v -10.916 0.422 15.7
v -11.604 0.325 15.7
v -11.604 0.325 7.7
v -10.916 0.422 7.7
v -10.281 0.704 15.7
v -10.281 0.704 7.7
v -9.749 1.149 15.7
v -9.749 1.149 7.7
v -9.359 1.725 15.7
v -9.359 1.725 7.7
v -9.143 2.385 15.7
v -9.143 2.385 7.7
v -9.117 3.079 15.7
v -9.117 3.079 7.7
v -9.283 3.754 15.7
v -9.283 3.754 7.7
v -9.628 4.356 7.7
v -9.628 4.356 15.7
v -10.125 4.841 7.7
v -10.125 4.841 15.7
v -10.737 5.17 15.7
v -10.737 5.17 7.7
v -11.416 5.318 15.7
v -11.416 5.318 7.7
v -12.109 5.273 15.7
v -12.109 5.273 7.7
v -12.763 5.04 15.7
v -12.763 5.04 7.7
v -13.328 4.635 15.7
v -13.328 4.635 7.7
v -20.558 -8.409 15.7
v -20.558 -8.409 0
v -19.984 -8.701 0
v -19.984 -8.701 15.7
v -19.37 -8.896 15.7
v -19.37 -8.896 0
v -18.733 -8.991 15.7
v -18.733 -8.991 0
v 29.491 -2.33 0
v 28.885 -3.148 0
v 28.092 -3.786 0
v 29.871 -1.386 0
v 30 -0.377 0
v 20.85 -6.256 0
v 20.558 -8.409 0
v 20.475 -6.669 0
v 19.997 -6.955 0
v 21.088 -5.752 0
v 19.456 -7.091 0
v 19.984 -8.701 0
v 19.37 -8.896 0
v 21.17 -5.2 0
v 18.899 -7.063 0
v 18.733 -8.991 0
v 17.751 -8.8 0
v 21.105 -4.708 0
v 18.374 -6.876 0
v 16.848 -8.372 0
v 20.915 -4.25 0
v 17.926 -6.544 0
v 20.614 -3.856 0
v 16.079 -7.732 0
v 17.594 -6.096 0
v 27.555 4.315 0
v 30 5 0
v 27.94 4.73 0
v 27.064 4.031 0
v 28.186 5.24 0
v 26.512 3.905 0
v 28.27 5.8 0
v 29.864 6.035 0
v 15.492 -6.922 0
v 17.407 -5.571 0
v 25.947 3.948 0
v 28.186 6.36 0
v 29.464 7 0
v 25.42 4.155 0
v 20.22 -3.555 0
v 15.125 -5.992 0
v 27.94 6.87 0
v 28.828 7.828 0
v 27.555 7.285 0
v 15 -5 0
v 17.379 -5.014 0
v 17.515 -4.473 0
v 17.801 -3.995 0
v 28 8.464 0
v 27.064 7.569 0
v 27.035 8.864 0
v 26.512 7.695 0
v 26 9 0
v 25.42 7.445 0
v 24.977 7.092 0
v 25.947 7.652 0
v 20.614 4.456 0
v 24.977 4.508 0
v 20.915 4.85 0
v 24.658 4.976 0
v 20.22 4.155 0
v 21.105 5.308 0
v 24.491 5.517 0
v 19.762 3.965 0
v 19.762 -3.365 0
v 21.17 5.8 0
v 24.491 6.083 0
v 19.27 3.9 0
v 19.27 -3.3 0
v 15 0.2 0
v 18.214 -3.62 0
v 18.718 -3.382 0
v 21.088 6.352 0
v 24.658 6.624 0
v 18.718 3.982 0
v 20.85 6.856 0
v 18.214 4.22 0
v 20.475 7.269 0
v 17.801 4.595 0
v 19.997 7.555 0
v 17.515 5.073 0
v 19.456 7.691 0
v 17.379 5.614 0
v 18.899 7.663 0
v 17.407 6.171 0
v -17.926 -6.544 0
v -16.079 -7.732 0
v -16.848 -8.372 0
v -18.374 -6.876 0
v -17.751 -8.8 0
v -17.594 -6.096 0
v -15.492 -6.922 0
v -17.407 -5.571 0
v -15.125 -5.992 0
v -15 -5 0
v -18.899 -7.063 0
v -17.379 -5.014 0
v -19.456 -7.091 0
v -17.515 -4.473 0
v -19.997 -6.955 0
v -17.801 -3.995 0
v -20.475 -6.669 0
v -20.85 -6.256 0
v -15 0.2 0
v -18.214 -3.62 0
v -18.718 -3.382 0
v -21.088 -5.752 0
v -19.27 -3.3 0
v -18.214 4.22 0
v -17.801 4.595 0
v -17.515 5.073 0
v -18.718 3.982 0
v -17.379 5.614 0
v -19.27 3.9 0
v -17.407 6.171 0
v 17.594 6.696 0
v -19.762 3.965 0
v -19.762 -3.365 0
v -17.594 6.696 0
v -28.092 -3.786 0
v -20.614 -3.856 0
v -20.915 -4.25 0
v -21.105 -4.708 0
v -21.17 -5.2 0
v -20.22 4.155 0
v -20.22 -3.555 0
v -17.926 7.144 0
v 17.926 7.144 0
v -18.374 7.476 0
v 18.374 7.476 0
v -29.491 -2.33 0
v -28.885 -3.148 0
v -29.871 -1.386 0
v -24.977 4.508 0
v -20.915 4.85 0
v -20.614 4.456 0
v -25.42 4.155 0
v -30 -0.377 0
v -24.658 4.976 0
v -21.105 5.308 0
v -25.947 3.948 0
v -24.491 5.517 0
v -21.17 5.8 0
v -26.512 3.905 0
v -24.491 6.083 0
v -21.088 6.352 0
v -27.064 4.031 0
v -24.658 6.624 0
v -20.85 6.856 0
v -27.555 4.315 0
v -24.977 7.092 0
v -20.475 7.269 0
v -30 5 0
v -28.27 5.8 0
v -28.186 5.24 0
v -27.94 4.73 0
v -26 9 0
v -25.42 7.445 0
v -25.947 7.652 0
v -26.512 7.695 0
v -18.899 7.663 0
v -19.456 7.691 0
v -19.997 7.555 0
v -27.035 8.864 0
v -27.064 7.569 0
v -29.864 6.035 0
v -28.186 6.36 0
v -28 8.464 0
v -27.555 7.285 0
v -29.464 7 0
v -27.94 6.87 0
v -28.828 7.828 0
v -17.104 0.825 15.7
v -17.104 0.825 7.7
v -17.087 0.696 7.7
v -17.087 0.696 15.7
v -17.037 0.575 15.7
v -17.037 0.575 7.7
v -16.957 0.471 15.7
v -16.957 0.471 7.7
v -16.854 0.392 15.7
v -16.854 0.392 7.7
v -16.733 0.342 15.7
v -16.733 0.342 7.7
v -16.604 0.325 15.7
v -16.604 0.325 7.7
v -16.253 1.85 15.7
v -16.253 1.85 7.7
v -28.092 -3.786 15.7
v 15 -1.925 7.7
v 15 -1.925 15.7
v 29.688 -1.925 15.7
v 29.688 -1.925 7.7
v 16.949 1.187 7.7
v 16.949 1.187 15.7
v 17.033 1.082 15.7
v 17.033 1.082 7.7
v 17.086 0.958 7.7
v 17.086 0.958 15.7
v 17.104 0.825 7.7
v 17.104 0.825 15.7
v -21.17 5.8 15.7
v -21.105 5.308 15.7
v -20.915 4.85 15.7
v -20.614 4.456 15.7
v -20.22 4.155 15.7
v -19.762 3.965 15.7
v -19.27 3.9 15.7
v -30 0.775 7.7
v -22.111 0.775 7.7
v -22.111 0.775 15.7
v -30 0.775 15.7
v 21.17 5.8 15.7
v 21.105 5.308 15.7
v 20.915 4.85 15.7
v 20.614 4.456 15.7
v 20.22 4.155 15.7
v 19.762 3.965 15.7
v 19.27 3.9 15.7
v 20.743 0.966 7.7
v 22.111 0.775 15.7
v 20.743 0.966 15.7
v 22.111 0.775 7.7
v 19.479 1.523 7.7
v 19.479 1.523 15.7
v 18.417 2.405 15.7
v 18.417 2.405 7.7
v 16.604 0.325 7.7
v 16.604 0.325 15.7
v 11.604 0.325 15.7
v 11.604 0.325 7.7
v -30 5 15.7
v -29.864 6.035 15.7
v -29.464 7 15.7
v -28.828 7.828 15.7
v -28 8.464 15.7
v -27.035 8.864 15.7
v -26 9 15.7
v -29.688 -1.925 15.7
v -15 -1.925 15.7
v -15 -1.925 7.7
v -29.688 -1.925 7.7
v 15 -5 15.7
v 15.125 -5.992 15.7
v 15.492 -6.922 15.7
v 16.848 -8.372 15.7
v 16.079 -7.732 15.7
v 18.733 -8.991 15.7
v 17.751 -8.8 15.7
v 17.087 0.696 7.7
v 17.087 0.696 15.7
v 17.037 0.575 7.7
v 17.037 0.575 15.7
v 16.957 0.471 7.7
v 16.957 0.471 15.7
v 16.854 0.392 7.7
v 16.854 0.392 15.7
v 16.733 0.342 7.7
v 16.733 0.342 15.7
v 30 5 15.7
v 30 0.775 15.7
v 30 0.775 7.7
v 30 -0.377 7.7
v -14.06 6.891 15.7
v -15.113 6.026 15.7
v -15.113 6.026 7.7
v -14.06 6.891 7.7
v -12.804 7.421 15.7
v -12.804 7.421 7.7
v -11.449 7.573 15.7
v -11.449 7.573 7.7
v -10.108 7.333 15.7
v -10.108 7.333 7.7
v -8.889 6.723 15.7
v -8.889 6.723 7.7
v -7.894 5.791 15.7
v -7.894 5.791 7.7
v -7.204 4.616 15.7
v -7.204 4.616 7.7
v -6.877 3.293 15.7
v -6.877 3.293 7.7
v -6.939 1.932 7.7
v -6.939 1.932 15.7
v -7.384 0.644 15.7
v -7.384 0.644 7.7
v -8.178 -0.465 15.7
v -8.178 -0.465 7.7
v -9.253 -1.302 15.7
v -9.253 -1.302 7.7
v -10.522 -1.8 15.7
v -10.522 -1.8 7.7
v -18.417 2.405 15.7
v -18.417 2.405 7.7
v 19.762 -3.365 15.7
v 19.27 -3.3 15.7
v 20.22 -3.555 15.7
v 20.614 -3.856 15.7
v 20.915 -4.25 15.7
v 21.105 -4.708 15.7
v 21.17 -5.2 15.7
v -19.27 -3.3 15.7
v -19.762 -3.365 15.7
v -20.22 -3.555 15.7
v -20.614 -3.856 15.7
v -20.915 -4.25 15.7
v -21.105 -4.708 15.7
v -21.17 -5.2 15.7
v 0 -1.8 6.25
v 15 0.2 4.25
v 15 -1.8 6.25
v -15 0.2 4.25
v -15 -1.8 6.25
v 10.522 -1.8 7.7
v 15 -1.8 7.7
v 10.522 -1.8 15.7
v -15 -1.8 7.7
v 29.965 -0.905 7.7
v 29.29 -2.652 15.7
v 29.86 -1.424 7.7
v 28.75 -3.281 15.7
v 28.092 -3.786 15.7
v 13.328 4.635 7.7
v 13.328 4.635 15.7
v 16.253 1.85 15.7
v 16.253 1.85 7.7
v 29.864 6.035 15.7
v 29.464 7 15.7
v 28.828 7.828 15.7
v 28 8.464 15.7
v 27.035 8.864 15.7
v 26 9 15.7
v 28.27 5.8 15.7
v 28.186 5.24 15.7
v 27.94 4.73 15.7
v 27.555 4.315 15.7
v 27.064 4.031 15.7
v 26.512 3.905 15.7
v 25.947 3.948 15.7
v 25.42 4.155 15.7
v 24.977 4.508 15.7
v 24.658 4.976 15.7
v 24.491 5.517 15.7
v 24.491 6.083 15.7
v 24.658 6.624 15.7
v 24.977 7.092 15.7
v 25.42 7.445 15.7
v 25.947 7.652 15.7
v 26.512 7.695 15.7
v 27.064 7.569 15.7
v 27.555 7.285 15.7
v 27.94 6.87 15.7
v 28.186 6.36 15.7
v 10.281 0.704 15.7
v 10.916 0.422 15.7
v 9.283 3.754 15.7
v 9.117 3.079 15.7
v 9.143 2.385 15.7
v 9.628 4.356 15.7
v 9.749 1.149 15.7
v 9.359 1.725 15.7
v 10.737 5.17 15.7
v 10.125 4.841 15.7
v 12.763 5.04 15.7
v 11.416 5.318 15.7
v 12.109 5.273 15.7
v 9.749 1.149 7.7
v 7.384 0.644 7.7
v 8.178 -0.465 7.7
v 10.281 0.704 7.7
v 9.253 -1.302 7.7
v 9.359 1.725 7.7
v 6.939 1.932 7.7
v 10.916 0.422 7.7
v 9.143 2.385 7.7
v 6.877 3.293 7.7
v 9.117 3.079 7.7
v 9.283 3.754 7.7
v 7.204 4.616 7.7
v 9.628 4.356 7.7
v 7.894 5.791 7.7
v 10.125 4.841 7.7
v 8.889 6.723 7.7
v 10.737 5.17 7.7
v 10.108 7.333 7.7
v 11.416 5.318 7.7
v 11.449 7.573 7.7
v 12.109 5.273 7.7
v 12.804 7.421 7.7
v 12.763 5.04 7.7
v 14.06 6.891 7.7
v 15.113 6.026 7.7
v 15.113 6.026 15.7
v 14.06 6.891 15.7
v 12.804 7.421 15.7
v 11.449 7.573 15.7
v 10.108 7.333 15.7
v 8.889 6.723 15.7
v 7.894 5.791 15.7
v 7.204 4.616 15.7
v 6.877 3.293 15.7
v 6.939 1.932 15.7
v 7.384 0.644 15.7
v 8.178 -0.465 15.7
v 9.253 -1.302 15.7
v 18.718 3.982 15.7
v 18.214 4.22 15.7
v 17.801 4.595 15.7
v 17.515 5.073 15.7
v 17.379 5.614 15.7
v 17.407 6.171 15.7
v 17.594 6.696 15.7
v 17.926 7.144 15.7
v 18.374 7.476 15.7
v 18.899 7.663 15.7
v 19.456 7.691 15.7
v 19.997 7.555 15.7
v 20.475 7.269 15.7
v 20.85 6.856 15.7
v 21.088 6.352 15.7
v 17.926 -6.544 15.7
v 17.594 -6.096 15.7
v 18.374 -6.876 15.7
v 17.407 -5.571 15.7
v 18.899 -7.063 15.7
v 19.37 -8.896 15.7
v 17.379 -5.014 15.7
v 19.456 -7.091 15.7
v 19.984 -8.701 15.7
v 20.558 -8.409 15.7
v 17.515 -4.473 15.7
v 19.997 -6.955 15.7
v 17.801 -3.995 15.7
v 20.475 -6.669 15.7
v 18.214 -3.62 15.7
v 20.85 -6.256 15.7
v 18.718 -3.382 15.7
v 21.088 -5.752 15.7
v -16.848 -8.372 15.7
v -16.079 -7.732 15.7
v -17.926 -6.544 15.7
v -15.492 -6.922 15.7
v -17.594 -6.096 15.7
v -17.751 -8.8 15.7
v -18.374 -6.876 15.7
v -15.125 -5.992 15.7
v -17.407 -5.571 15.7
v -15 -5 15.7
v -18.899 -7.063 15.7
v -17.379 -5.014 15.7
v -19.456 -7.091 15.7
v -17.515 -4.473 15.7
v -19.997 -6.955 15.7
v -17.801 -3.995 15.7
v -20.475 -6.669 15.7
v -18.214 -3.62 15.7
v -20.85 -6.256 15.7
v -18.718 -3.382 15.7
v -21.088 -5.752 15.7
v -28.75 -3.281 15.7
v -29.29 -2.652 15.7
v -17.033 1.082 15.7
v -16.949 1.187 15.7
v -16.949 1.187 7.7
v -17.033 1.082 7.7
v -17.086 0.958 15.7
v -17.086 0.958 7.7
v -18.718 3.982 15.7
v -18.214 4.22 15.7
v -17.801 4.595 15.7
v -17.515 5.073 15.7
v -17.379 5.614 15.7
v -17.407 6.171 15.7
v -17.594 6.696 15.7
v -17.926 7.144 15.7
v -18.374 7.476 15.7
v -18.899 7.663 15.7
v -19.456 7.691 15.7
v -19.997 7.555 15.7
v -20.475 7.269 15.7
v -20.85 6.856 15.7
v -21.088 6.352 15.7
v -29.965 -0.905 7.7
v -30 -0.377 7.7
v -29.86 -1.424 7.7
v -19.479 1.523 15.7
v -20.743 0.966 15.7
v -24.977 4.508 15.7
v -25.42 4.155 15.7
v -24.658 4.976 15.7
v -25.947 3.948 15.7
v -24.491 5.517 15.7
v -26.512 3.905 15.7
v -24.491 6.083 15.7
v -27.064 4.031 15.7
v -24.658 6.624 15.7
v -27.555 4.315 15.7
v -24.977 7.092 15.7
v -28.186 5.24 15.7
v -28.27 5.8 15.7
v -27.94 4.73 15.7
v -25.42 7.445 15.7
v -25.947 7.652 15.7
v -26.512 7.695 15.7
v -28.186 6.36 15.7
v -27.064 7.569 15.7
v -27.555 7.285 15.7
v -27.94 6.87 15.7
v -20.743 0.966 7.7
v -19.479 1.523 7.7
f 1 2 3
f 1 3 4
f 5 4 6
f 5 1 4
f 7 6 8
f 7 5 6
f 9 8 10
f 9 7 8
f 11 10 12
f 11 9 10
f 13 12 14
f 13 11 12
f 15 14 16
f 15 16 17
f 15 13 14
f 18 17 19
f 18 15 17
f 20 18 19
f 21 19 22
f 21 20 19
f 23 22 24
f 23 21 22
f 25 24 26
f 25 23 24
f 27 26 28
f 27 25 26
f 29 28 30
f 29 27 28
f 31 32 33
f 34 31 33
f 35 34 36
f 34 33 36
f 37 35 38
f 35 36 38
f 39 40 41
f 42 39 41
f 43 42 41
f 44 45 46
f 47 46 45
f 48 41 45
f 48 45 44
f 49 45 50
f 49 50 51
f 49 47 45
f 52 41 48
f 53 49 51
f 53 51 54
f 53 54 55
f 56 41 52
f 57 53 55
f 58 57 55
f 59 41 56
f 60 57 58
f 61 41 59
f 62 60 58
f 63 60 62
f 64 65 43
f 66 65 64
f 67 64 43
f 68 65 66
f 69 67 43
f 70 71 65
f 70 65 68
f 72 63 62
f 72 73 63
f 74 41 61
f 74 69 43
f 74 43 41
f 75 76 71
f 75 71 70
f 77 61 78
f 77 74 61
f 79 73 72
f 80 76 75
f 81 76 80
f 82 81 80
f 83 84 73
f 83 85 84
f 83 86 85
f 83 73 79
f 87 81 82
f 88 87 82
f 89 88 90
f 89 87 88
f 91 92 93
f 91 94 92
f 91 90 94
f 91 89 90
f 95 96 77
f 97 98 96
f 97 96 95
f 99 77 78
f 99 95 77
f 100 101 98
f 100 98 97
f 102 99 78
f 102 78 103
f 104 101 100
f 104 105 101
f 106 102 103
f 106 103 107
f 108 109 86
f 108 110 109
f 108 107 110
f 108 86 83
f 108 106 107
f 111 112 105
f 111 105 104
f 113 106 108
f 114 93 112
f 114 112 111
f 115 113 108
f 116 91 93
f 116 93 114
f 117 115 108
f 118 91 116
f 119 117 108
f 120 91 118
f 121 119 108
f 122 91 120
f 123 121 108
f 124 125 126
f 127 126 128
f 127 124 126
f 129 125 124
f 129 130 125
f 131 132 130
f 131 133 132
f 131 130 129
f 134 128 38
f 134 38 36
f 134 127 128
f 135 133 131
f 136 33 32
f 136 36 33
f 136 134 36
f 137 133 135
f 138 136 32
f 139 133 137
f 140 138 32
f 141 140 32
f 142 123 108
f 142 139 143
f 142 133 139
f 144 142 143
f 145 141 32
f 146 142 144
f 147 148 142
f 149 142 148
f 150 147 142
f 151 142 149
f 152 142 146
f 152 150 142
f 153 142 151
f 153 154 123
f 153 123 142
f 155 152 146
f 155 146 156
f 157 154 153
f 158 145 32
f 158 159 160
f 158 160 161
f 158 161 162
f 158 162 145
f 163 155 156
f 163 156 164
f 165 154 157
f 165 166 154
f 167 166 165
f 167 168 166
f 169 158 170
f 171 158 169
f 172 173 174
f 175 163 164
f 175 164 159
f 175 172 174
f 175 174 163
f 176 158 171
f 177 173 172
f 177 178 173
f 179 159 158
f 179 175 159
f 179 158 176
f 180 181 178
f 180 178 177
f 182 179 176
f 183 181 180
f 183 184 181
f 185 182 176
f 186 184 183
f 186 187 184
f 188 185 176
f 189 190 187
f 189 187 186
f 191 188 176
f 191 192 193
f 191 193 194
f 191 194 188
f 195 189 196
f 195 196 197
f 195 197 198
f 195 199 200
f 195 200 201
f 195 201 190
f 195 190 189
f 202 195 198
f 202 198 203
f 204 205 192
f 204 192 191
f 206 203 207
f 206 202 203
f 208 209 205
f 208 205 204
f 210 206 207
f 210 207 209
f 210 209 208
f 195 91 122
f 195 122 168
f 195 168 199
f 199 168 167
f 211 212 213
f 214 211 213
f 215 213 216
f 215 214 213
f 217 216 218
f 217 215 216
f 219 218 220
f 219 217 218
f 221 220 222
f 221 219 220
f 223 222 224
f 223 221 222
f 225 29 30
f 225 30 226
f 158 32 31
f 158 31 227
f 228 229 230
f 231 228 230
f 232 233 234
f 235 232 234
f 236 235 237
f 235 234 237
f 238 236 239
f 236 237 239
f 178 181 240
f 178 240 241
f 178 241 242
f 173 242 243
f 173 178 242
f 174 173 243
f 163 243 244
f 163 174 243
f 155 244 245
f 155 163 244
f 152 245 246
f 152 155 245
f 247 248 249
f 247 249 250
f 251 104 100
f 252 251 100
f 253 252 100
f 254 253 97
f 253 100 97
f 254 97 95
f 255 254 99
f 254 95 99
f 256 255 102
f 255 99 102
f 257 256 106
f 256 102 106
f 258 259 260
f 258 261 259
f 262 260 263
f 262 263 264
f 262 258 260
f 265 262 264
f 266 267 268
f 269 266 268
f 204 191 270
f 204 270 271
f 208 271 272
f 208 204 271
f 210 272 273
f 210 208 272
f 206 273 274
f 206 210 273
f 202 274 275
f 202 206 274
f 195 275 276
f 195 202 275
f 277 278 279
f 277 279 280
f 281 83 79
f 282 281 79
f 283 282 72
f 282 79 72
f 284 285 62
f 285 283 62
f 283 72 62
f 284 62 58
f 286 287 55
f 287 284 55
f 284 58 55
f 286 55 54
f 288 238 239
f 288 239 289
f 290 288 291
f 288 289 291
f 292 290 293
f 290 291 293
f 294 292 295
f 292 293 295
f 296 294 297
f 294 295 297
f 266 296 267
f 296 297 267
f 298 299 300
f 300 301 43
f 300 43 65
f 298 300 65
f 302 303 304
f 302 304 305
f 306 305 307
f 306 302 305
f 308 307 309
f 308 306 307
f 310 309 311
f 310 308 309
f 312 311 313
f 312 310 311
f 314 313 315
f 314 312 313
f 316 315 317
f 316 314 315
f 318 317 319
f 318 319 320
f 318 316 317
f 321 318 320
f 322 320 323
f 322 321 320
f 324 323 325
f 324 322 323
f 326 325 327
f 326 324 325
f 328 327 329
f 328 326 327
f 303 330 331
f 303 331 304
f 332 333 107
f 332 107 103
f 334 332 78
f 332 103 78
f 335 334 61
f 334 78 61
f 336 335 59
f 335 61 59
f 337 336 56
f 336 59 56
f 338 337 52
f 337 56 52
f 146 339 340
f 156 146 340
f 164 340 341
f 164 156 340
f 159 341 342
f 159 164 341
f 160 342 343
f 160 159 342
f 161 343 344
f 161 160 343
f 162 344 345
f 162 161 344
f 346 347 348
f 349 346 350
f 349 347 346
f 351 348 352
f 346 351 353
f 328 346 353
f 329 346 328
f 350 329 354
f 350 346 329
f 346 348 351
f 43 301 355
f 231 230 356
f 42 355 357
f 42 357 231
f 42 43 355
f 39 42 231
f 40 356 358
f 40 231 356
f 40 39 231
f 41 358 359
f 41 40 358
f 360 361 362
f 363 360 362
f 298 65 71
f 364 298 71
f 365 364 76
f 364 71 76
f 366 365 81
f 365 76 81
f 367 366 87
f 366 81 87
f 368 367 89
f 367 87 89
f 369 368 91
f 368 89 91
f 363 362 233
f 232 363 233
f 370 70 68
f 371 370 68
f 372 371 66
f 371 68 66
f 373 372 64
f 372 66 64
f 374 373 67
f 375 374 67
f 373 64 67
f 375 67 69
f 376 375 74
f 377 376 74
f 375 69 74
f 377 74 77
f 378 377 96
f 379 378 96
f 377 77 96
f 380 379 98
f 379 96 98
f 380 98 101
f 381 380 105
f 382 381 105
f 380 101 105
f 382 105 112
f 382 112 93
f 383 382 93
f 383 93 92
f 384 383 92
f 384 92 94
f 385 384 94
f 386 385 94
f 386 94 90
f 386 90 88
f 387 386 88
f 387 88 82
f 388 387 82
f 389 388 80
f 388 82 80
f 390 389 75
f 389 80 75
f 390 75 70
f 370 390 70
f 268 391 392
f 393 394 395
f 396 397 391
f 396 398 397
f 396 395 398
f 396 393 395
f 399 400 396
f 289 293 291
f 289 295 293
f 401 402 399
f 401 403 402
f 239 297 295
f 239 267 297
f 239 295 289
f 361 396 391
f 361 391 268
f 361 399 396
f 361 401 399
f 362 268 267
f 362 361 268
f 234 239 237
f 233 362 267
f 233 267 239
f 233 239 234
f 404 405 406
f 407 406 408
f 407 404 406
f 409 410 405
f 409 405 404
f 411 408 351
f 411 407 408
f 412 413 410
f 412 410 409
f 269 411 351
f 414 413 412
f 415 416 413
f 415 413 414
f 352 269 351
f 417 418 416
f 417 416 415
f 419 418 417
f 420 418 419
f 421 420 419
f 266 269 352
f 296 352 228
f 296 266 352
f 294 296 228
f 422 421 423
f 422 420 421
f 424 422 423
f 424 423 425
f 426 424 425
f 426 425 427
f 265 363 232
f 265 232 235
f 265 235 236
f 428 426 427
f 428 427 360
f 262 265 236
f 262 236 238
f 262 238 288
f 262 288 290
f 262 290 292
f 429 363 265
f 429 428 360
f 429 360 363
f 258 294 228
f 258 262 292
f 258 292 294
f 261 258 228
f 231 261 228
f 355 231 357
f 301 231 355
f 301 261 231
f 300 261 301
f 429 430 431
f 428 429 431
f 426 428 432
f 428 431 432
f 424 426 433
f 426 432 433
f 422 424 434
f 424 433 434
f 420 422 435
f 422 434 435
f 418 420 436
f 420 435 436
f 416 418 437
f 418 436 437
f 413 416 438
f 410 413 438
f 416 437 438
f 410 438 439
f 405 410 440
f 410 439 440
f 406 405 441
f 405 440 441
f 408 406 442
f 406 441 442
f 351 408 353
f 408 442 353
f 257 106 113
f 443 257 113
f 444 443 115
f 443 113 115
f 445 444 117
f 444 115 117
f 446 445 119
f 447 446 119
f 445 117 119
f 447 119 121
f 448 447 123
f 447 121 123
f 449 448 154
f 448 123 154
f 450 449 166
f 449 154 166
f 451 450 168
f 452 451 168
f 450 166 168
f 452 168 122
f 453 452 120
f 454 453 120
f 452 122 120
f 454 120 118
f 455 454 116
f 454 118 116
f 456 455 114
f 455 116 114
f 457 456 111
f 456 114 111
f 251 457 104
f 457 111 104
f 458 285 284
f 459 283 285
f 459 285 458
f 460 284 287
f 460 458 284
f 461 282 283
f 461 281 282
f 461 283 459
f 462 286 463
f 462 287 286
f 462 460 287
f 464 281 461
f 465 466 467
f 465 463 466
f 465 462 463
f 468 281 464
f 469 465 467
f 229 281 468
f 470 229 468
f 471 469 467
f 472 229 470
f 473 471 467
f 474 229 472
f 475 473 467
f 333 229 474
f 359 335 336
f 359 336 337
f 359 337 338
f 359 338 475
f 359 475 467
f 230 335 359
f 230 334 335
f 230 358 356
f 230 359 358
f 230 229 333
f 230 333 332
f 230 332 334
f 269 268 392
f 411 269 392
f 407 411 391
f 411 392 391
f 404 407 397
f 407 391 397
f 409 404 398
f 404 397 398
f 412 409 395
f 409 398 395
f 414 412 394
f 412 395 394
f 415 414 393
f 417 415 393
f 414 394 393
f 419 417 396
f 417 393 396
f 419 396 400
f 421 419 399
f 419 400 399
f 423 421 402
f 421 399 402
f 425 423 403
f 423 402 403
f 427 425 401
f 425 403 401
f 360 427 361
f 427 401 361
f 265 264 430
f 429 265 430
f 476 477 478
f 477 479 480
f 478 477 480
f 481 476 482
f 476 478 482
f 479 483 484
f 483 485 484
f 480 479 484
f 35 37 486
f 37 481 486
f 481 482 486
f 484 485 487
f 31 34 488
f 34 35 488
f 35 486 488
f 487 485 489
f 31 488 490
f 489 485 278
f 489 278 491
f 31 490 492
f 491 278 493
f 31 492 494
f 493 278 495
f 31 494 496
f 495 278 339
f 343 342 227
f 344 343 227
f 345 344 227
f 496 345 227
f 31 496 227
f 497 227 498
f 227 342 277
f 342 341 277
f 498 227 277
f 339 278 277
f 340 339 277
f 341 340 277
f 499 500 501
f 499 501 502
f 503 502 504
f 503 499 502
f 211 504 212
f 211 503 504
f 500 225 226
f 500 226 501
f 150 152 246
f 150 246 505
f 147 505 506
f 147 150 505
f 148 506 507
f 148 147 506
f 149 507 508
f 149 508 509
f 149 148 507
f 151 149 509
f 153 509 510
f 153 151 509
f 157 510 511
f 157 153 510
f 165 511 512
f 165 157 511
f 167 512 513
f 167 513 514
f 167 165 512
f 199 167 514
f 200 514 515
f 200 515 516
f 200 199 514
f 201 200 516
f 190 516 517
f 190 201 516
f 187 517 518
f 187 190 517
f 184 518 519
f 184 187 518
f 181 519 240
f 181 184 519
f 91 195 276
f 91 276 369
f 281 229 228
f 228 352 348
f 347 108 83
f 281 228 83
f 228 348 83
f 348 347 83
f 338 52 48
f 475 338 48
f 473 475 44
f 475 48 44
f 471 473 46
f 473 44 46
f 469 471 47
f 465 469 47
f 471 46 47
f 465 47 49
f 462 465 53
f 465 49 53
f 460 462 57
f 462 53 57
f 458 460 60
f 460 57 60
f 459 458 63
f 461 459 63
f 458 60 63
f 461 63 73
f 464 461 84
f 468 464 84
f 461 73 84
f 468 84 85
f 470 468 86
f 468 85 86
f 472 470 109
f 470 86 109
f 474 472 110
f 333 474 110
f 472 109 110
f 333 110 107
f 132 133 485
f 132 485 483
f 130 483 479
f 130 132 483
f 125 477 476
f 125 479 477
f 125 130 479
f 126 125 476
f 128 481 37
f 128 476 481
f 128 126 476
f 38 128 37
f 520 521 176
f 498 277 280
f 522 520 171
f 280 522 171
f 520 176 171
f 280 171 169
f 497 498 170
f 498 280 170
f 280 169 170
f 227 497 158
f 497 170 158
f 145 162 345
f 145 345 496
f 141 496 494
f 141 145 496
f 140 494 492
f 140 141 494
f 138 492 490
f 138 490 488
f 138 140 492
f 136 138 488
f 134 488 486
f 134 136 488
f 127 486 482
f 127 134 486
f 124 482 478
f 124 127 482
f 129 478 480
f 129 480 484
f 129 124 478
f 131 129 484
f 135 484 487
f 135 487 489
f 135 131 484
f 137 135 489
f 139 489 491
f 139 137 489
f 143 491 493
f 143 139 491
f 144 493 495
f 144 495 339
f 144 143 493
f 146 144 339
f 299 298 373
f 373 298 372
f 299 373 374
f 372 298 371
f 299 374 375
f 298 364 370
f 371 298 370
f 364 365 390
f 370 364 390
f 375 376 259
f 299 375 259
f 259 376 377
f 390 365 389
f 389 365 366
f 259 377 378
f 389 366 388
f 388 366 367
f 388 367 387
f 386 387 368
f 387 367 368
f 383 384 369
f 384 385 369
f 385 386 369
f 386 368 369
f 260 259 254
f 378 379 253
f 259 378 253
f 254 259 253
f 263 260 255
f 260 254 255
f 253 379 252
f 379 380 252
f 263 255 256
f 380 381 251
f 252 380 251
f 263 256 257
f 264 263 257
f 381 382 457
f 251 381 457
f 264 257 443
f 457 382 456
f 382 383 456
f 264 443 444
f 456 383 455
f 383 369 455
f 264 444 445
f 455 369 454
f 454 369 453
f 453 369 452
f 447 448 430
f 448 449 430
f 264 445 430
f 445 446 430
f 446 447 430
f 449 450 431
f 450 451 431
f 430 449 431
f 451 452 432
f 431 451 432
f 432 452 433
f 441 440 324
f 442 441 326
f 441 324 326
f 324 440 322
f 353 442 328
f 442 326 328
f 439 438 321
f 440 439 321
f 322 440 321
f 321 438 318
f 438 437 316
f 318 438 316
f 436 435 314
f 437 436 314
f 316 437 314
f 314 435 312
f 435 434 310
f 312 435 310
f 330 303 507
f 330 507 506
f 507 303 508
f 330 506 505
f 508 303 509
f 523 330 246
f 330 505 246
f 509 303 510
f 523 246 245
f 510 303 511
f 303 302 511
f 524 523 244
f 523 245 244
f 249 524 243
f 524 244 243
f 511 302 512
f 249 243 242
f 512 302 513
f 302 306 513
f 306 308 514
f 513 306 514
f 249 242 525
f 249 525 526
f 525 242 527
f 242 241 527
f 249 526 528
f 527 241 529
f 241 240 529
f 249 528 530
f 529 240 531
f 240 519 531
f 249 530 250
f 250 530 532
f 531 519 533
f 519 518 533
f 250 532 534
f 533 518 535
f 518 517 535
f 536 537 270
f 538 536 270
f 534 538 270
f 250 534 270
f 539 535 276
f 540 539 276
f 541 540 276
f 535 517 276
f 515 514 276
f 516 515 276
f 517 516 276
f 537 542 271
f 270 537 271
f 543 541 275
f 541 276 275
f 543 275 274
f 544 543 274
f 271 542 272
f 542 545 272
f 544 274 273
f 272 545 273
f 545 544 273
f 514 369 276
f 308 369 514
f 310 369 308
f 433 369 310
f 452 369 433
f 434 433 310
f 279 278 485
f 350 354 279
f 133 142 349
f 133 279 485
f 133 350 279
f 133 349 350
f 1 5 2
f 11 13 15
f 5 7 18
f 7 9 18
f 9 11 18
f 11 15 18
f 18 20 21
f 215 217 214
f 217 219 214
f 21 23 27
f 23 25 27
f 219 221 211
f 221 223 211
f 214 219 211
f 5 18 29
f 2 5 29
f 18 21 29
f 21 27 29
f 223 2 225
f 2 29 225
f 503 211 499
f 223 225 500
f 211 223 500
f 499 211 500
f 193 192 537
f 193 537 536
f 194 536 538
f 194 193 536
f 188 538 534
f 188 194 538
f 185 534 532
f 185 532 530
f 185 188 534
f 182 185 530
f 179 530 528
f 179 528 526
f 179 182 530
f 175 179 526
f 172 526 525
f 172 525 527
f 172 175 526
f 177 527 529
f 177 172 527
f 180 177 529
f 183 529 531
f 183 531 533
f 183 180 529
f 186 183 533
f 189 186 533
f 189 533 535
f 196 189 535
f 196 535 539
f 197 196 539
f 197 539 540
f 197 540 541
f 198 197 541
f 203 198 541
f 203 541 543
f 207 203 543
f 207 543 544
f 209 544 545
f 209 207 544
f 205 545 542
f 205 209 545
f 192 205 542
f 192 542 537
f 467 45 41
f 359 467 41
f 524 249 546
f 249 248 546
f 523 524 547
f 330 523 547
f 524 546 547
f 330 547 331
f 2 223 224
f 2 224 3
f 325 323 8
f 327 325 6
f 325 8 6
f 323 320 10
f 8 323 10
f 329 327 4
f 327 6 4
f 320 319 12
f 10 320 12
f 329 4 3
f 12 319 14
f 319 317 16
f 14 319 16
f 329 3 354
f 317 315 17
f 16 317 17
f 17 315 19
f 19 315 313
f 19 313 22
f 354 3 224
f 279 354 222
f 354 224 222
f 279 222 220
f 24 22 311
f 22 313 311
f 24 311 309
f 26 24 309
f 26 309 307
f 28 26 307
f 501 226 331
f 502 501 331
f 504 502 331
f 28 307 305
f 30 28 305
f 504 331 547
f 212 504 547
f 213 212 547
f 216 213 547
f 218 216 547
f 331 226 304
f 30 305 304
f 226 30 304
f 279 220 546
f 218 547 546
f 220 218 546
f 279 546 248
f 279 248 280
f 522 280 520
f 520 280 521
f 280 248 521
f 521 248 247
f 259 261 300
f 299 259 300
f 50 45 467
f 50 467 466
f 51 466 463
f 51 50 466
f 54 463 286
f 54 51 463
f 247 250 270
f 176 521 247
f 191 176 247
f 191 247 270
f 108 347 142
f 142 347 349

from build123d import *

# Parameters (mm, degrees)
F1_DEPTH    = 15.7
F2_W        = 10.0960650777
F2_H        = 2.7
F3_DEPTH    = 8
F4_R        = 5
F5_T1_DEPTH = 26.8923143391
F5_T3_DEPTH = 21.3473434867
F5_T5_DEPTH = 35.7
F6_W        = 15
F6_H        = 6.25
F7_DEPTH    = 2
F8_SIZE     = 1.99999


# Not quite as in the source:
# - a fillet or chamfer that OpenCascade refuses, or shapes differently, is made with other operations: its cross-section is extruded or revolved along the edge and cut away or added
# - a fillet or chamfer is up to 0.001 mm smaller than in the source, because OpenCascade refuses the exact size


with BuildPart() as f1:
    # F0 (on Top) → F1 (new body)
    with BuildSketch(Plane.XY):
        Polygon((30, 9), (0, 9), (0, -1.8), (15, -1.8), (15, -9), (19.5954625243, -9), (30, -2.6151265483), align=None)
        with BuildLine():
            ThreePointArc((21.17, -5.2), (17.9264971157, -6.5435028843), (19.27, -3.3))
            ThreePointArc((19.27, -3.3), (20.6135028843, -3.8564971157), (21.17, -5.2))
        make_face(mode=Mode.SUBTRACT)
        with BuildLine():
            ThreePointArc((19.27, 3.9), (17.9264971157, 7.1435028843), (21.17, 5.8))
            ThreePointArc((21.17, 5.8), (20.6135028843, 4.4564971157), (19.27, 3.9))
        make_face(mode=Mode.SUBTRACT)
        with BuildLine():
            ThreePointArc((24.47, 5.8), (26.37, 7.7), (28.27, 5.8))
            ThreePointArc((28.27, 5.8), (26.37, 3.9), (24.47, 5.8))
        make_face(mode=Mode.SUBTRACT)
    extrude(amount=F1_DEPTH)

    # F2 (on face) → F3 (cut)
    with BuildSketch(Plane.XY.offset(15.7)):
        with BuildLine():
            ThreePointArc((11.6039349223, 0.3250306588), (9.2827431951, 3.7535073497), (13.3280728534, 4.6353754864))
            Line((13.3280728534, 4.6353754864), (16.2527744297, 1.8499454137))
            ThreePointArc((16.2527744297, 1.8499454137), (16.328577113, 2.3348713274), (16.3539349223, 2.8250306588))
            ThreePointArc((16.3539349223, 2.8250306588), (16.0328522645, 4.5417691876), (15.1130123218, 6.0264172029))
            ThreePointArc((15.1130123218, 6.0264172029), (7.5069370658, 5.2285923001), (10.5215341623, -1.8))
            Line((10.5215341623, -1.8), (12.6863356823, -1.8))
            ThreePointArc((12.6863356823, -1.8), (14.376262754, -1.0320016711), (15.6428085277, 0.3250306588))
            Line((15.6428085277, 0.3250306588), (11.6039349223, 0.3250306588))
        make_face()
        with BuildLine():
            ThreePointArc((16.3539349223, 2.8250306588), (16.328577113, 2.3348713274), (16.2527744297, 1.8499454137))
            Line((16.2527744297, 1.8499454137), (16.9487625085, 1.1870996243))
            ThreePointArc((16.9487625085, 1.1870996243), (17.0635074373, 1.0219903081), (17.1039349223, 0.8250306588))
            ThreePointArc((17.1039349223, 0.8250306588), (16.9574883129, 0.4714772682), (16.6039349223, 0.3250306588))
            Line((16.6039349223, 0.3250306588), (15.6428085277, 0.3250306588))
            ThreePointArc((15.6428085277, 0.3250306588), (14.376262754, -1.0320016711), (12.6863356823, -1.8))
            Line((12.6863356823, -1.8), (15, -1.8))
            Line((15, -1.8), (15, -1.9249693412))
            Line((15, -1.9249693412), (19.9039349223, -1.9249693412))
            Line((19.9039349223, -1.9249693412), (19.9039349223, 0.7750306588))
            Line((19.9039349223, 0.7750306588), (15.1130123218, 6.0264172029))
            ThreePointArc((15.1130123218, 6.0264172029), (16.0328522645, 4.5417691876), (16.3539349223, 2.8250306588))
        make_face()
        with Locations((24.9519674612, -0.5749693412)):
            Rectangle(F2_W, F2_H)
    extrude(amount=-F3_DEPTH, mode=Mode.SUBTRACT)

    # F4
    f4_edges = [f1.edges().sort_by_distance(p)[0] for p in [
        (19.903935, 0.775031, 11.7),
    ]]
    fillet(f4_edges, radius=F4_R)

    # F5: fillet of radius 4 on 4 edges, made by hand

    # F5_s2 → F5_t1 (cut)
    with BuildSketch(Plane.XY.offset(-5.5961571696)):
        with BuildLine():
            ThreePointArc((30, -0.3766636805), (29.4905957559, -2.3300559271), (28.0921293656, -3.7859150232))
            Line((28.0921293656, -3.7859150232), (30, -2.6151265483))
            Line((30, -2.6151265483), (30, -0.3766636805))
        make_face()
    extrude(amount=F5_T1_DEPTH, mode=Mode.SUBTRACT)

    # F5_s4 → F5_t3 (cut)
    with BuildSketch(Plane.XY.offset(-2.8236717433)):
        with BuildLine():
            ThreePointArc((20.5581231925, -8.4092513427), (19.5529608525, -8.8494808332), (18.465993827, -9))
            Line((18.465993827, -9), (19.5954625243, -9))
            Line((19.5954625243, -9), (20.5581231925, -8.4092513427))
        make_face()
    extrude(amount=F5_T3_DEPTH, mode=Mode.SUBTRACT)

    # F5_s6 → F5_t5 (cut)
    with BuildSketch(Plane.XY.offset(-10)):
        with BuildLine():
            ThreePointArc((15, -5), (16.1715728753, -7.8284271247), (19, -9))
            Line((19, -9), (15, -9))
            Line((15, -9), (15, -5))
        make_face()
        with BuildLine():
            ThreePointArc((30, 5), (28.8284271247, 7.8284271247), (26, 9))
            Line((26, 9), (30, 9))
            Line((30, 9), (30, 5))
        make_face()
    extrude(amount=F5_T5_DEPTH, mode=Mode.SUBTRACT)

    # F6 (on face) → F7 (cut)
    with BuildSketch(Plane.XZ.offset(1.8)):
        with Locations((7.5, 3.125)):
            Rectangle(F6_W, F6_H)
    extrude(amount=-F7_DEPTH, mode=Mode.SUBTRACT)

    # F8 (size 2 in the source; OpenCascade refuses exactly that, so slightly less here)
    f8_edges = [f1.edges().sort_by_distance(p)[0] for p in [
        (7.5, 0.2, 6.25),
    ]]
    chamfer(f8_edges, length=F8_SIZE)

    # F9: F1 across plane


with BuildPart() as f1_1:
    add(f1.part)
    add(f1.part.mirror(Plane.YZ))


solid = f1_1.part
